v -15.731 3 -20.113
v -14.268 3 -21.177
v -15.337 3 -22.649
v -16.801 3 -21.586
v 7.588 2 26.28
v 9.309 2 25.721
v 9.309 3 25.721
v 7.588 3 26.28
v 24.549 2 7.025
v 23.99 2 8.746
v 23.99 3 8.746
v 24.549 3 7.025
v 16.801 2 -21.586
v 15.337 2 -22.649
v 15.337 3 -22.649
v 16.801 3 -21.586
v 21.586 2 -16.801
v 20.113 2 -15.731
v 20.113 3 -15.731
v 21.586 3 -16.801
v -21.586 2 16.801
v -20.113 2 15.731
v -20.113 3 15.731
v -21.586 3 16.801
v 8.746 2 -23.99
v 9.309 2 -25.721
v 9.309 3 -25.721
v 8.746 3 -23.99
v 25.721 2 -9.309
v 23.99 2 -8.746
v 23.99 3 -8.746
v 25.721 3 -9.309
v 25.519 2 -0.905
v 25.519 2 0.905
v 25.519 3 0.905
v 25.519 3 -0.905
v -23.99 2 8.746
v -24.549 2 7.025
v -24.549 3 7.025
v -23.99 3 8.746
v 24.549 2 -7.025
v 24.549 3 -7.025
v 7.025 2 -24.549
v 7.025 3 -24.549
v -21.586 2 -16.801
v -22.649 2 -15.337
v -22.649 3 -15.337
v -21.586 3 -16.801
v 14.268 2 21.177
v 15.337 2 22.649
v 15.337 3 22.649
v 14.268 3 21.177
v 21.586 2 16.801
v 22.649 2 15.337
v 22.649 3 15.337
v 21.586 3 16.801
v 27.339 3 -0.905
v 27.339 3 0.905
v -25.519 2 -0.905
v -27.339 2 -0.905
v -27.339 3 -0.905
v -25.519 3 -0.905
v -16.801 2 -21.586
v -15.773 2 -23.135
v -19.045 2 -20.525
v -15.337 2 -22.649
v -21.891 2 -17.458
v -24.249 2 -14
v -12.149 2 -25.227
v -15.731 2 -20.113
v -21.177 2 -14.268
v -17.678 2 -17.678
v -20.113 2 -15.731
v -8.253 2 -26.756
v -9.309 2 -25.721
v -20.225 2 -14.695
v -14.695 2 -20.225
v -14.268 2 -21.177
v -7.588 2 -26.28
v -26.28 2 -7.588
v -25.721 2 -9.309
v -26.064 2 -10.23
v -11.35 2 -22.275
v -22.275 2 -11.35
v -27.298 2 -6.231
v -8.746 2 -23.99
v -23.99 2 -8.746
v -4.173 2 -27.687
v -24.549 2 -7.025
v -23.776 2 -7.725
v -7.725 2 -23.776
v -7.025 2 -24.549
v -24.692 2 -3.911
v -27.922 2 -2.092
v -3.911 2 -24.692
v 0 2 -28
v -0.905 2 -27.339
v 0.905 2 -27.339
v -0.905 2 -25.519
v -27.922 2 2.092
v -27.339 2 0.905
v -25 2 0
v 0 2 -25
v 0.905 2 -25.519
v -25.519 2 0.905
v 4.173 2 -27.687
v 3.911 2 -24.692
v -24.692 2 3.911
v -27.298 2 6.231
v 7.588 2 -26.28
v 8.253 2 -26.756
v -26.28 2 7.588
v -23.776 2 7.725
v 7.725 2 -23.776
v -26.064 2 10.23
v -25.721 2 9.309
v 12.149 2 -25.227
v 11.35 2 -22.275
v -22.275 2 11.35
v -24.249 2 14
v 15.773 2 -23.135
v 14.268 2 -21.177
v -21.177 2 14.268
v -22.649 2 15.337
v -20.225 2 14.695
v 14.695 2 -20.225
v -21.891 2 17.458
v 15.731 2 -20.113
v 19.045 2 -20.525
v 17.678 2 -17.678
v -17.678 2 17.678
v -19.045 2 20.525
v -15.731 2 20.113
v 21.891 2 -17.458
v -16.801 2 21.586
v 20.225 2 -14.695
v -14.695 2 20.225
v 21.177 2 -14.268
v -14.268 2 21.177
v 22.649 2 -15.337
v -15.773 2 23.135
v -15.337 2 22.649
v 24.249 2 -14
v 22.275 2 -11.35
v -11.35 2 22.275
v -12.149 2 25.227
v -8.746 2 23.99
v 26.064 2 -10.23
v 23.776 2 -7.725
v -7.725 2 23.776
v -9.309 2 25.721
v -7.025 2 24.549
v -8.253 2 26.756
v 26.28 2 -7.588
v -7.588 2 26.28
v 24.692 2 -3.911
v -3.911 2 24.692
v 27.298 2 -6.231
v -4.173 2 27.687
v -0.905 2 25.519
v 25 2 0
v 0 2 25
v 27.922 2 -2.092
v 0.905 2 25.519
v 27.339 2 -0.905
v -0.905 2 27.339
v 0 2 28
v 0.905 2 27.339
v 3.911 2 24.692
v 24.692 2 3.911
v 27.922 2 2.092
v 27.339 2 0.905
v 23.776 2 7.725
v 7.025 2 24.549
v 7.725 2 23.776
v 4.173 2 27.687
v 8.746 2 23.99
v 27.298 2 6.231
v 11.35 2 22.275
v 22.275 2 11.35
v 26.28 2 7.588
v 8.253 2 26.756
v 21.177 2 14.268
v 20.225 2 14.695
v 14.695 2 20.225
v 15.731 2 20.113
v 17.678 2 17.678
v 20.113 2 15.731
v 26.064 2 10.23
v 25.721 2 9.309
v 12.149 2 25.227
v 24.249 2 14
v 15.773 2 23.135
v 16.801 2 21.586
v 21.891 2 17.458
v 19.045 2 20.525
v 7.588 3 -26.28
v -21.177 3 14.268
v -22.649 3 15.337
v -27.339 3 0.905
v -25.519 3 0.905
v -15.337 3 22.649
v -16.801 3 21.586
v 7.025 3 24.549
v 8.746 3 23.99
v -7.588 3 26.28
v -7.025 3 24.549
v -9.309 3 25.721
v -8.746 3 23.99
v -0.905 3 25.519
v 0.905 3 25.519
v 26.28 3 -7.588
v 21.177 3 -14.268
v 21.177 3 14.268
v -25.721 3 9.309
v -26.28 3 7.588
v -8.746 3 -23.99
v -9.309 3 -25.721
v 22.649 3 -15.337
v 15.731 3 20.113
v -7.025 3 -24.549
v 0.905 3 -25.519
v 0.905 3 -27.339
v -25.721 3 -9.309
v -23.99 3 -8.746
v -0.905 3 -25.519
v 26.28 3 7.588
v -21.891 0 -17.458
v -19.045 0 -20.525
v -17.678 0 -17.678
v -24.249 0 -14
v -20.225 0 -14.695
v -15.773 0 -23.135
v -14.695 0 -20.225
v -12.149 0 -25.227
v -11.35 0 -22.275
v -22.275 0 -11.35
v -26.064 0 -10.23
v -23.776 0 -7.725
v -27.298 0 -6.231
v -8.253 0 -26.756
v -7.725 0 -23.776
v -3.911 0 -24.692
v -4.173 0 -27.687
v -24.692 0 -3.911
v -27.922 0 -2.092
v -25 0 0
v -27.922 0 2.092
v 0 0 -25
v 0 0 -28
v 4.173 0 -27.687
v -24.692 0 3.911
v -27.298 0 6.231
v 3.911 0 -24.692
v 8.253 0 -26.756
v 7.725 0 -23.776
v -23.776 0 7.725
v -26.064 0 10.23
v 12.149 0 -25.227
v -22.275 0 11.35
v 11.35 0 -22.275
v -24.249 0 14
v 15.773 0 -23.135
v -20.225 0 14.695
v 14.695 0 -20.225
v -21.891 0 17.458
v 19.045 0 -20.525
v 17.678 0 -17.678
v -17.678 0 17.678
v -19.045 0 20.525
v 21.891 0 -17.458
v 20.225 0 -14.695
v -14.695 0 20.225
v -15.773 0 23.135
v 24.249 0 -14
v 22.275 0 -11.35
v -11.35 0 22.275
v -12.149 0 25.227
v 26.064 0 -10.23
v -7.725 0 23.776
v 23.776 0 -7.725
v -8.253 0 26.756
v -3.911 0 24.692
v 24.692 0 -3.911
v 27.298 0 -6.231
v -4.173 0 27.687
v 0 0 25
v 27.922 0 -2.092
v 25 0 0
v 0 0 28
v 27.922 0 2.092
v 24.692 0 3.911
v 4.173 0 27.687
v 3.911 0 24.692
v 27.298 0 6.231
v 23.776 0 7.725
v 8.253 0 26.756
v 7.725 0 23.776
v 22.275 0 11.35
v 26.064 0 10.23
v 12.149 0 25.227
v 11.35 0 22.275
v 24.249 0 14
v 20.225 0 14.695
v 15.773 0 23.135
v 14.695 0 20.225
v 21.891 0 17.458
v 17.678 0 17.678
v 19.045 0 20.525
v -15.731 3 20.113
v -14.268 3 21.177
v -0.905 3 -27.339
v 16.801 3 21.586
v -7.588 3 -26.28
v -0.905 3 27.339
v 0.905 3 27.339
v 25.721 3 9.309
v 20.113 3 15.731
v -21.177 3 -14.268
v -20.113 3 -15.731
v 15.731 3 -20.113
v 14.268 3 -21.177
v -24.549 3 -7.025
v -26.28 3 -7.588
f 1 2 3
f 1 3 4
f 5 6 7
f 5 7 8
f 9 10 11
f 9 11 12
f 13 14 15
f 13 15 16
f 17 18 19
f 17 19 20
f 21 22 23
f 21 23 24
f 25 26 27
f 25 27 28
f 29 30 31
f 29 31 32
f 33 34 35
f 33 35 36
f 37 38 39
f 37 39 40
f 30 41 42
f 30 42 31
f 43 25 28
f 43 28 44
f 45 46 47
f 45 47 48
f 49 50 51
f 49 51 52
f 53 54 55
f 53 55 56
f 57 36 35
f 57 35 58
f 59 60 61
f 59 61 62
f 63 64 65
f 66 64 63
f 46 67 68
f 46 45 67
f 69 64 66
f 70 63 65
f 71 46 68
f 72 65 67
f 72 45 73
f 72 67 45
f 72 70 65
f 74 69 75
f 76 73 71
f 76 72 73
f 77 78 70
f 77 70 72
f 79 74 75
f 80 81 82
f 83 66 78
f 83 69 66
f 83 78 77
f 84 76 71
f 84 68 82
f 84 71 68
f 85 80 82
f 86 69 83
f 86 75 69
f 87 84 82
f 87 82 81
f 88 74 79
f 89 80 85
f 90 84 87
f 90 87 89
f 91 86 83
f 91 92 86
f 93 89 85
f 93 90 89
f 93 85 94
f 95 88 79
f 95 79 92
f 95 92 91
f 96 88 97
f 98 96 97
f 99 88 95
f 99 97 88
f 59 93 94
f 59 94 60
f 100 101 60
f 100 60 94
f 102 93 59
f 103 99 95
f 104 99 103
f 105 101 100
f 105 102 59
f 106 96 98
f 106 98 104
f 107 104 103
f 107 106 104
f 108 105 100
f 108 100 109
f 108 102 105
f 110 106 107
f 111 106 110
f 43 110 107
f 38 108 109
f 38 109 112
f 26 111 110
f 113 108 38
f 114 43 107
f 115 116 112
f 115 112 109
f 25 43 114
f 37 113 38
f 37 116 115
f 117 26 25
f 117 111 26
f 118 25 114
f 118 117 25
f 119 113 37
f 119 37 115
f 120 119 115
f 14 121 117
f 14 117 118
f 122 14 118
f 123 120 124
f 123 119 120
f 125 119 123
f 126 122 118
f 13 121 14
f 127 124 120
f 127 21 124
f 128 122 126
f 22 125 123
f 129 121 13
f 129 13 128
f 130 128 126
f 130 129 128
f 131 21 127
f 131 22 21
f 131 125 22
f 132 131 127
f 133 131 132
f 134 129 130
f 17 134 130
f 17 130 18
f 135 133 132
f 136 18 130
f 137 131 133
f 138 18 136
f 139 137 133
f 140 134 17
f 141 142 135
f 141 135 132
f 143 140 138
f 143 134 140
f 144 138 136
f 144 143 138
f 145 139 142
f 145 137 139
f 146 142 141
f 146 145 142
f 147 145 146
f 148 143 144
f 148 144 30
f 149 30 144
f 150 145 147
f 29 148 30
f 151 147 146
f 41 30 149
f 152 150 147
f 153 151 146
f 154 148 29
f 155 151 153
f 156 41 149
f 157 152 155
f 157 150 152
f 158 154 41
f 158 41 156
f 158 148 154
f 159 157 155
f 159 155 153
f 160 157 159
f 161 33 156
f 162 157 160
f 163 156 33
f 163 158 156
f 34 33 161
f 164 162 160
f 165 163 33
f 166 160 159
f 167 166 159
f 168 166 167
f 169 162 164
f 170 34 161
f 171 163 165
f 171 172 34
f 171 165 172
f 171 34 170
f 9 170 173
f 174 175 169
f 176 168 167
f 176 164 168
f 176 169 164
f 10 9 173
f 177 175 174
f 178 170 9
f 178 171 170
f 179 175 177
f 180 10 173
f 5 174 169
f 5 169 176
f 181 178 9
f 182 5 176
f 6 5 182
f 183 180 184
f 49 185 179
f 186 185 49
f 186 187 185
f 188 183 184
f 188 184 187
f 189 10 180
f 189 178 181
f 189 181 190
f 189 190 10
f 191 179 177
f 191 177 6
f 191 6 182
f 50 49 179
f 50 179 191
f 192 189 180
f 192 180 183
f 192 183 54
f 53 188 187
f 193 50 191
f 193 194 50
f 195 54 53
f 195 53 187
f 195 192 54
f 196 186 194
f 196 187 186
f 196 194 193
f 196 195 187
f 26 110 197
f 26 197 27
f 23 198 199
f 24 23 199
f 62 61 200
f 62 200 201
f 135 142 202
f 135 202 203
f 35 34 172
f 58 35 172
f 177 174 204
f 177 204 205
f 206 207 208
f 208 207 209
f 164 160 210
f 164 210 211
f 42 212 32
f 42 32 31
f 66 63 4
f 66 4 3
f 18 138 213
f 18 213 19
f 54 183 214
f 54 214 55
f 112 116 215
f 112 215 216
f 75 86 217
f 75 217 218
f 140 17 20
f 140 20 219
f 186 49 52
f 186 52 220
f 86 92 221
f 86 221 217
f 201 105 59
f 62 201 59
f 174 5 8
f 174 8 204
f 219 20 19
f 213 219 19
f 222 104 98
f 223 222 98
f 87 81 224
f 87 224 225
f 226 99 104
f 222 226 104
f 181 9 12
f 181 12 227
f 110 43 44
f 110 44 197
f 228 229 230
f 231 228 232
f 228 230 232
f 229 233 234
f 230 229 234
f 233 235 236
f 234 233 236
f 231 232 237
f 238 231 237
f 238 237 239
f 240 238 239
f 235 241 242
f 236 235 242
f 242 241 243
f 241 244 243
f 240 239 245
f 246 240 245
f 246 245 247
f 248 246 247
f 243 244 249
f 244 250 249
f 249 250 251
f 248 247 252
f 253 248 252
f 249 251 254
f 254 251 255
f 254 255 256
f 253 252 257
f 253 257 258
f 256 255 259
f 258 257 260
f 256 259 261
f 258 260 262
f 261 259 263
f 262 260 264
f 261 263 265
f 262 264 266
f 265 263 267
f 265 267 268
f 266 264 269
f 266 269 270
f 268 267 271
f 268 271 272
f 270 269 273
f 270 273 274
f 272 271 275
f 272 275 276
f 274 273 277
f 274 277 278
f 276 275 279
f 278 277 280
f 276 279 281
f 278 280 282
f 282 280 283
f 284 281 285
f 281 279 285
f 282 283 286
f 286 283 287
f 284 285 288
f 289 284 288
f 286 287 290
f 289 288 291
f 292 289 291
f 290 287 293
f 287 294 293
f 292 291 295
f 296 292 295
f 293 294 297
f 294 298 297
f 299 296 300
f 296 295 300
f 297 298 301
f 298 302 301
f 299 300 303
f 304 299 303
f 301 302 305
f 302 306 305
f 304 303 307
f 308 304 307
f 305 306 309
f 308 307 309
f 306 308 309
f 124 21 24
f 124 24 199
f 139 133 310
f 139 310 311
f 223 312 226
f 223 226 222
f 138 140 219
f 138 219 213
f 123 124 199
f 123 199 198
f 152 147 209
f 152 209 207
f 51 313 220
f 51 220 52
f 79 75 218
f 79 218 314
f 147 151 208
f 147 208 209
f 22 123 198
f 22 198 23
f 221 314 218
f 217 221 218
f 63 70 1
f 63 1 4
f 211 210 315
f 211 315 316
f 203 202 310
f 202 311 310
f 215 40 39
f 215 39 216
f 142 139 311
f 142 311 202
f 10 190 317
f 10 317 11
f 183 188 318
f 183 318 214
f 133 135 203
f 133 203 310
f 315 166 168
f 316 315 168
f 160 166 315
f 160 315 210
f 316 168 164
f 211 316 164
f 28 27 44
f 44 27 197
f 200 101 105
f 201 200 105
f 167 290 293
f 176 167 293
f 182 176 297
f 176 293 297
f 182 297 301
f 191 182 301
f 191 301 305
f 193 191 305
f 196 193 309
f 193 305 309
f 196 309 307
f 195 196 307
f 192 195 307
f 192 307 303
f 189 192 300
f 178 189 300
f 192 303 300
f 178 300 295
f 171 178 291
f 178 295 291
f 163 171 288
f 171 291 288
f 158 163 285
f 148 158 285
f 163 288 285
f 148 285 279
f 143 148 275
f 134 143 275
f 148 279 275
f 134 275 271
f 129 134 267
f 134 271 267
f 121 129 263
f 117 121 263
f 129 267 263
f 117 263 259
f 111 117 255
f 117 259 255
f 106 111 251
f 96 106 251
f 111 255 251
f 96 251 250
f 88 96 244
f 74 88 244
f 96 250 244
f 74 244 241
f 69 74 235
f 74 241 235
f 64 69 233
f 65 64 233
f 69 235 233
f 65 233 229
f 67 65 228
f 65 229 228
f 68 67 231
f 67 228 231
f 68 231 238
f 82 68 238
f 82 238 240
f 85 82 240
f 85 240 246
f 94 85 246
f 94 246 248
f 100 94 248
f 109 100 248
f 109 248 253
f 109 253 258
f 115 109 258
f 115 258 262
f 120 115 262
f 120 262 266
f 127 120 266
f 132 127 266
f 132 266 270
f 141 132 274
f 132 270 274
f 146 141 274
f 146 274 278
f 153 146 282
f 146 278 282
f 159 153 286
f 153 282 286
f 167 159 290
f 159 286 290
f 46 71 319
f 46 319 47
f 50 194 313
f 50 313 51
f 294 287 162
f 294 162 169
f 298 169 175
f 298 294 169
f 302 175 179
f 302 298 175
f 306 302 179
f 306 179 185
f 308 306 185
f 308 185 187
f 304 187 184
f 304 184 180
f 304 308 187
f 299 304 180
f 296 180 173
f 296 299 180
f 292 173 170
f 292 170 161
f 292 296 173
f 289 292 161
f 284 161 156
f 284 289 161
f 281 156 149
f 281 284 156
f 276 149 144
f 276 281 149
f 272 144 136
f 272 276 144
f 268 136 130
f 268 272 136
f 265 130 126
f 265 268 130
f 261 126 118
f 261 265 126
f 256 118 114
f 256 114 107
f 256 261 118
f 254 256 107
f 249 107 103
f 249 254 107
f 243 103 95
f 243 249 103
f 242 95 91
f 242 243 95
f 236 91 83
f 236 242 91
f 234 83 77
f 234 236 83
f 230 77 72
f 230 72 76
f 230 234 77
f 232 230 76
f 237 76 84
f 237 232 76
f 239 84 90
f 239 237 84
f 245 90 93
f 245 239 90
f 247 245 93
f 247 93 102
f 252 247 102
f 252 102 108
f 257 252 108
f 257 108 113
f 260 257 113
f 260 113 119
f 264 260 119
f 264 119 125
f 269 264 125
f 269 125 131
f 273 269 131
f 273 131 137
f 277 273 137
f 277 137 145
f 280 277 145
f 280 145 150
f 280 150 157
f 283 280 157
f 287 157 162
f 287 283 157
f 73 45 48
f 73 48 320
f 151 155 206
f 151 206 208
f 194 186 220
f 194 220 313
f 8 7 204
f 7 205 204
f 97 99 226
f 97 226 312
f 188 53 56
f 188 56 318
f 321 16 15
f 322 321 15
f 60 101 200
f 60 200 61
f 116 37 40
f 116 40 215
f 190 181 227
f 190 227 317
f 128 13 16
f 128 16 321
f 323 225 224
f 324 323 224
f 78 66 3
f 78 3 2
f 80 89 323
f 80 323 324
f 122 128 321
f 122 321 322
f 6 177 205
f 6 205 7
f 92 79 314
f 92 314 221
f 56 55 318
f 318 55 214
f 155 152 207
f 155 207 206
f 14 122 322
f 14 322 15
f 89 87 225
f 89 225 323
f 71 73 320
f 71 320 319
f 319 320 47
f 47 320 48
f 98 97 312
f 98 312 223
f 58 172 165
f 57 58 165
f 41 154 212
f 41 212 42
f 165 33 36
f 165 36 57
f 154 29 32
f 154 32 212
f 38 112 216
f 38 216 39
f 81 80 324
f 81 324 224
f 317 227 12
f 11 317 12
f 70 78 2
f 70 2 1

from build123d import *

# Parameters (mm, degrees)
SKETCH_1_R      = 28
SKETCH_1_R_2    = 25
EXTRUDE_1_DEPTH = 2
SKETCH_2_W      = 1.809411118
SKETCH_2_H      = 1.819947288
SKETCH_2_W_2    = 1.819947288
SKETCH_2_H_2    = 1.809411118
EXTRUDE_2_DEPTH = 1


with BuildPart() as part:
    # 草图1 → 凸台-拉伸1 (new body)
    with BuildSketch(Plane(origin=(0, 0, 0), x_dir=(1, 0, 0), z_dir=(0, 1, 0))):
        with Locations(Location((0, 0, 0), (0, 0, 270))):
            Circle(SKETCH_1_R)
        with Locations(Location((0, 0, 0), (0, 0, 270))):
            Circle(SKETCH_1_R_2, mode=Mode.SUBTRACT)
    extrude(amount=EXTRUDE_1_DEPTH)

    # 草图2 → 凸台-拉伸2 (add)
    with BuildSketch(Plane(origin=(0, 2, 0), x_dir=(1, 0, 0), z_dir=(0, 1, 0))):
        Polygon((7.587666599, 26.280125266), (9.308518833, 25.720986481), (8.746124192, 23.990113753), (7.025271959, 24.549252538), align=None)
        with Locations((0, 26.428628666)):
            Rectangle(SKETCH_2_W, SKETCH_2_H)
        Polygon((15.337305084, 22.649166456), (16.801149428, 21.585621286), (15.731411252, 20.113253001), (14.267566908, 21.176798171), align=None)
        Polygon((21.585621286, 16.801149428), (22.649166456, 15.337305084), (21.176798171, 14.267566908), (20.113253001, 15.731411252), align=None)
        Polygon((25.720986481, 9.308518833), (26.280125266, 7.587666599), (24.549252538, 7.025271959), (23.990113753, 8.746124192), align=None)
        with Locations((26.428628666, 0)):
            Rectangle(SKETCH_2_W_2, SKETCH_2_H_2)
        Polygon((26.280125266, -7.587666599), (25.720986481, -9.308518833), (23.990113753, -8.746124192), (24.549252538, -7.025271959), align=None)
        Polygon((22.649166456, -15.337305084), (21.585621286, -16.801149428), (20.113253001, -15.731411252), (21.176798171, -14.267566908), align=None)
        Polygon((16.801149428, -21.585621286), (15.337305084, -22.649166456), (14.267566908, -21.176798171), (15.731411252, -20.113253001), align=None)
        Polygon((9.308518833, -25.720986481), (7.587666599, -26.280125266), (7.025271959, -24.549252538), (8.746124192, -23.990113753), align=None)
        with Locations((0, -26.428628666)):
            Rectangle(SKETCH_2_W, SKETCH_2_H)
        Polygon((-7.587666599, -26.280125266), (-9.308518833, -25.720986481), (-8.746124192, -23.990113753), (-7.025271959, -24.549252538), align=None)
        Polygon((-15.337305084, -22.649166456), (-16.801149428, -21.585621286), (-15.731411252, -20.113253001), (-14.267566908, -21.176798171), align=None)
        Polygon((-21.585621286, -16.801149428), (-22.649166456, -15.337305084), (-21.176798171, -14.267566908), (-20.113253001, -15.731411252), align=None)
        Polygon((-25.720986481, -9.308518833), (-26.280125266, -7.587666599), (-24.549252538, -7.025271959), (-23.990113753, -8.746124192), align=None)
        with Locations((-26.428628666, 0)):
            Rectangle(SKETCH_2_W_2, SKETCH_2_H_2)
        Polygon((-26.280125266, 7.587666599), (-25.720986481, 9.308518833), (-23.990113753, 8.746124192), (-24.549252538, 7.025271959), align=None)
        Polygon((-22.649166456, 15.337305084), (-21.585621286, 16.801149428), (-20.113253001, 15.731411252), (-21.176798171, 14.267566908), align=None)
        Polygon((-16.801149428, 21.585621286), (-15.337305084, 22.649166456), (-14.267566908, 21.176798171), (-15.731411252, 20.113253001), align=None)
        Polygon((-9.308518833, 25.720986481), (-7.587666599, 26.280125266), (-7.025271959, 24.549252538), (-8.746124192, 23.990113753), align=None)
    extrude(amount=EXTRUDE_2_DEPTH)


solid = part.part
